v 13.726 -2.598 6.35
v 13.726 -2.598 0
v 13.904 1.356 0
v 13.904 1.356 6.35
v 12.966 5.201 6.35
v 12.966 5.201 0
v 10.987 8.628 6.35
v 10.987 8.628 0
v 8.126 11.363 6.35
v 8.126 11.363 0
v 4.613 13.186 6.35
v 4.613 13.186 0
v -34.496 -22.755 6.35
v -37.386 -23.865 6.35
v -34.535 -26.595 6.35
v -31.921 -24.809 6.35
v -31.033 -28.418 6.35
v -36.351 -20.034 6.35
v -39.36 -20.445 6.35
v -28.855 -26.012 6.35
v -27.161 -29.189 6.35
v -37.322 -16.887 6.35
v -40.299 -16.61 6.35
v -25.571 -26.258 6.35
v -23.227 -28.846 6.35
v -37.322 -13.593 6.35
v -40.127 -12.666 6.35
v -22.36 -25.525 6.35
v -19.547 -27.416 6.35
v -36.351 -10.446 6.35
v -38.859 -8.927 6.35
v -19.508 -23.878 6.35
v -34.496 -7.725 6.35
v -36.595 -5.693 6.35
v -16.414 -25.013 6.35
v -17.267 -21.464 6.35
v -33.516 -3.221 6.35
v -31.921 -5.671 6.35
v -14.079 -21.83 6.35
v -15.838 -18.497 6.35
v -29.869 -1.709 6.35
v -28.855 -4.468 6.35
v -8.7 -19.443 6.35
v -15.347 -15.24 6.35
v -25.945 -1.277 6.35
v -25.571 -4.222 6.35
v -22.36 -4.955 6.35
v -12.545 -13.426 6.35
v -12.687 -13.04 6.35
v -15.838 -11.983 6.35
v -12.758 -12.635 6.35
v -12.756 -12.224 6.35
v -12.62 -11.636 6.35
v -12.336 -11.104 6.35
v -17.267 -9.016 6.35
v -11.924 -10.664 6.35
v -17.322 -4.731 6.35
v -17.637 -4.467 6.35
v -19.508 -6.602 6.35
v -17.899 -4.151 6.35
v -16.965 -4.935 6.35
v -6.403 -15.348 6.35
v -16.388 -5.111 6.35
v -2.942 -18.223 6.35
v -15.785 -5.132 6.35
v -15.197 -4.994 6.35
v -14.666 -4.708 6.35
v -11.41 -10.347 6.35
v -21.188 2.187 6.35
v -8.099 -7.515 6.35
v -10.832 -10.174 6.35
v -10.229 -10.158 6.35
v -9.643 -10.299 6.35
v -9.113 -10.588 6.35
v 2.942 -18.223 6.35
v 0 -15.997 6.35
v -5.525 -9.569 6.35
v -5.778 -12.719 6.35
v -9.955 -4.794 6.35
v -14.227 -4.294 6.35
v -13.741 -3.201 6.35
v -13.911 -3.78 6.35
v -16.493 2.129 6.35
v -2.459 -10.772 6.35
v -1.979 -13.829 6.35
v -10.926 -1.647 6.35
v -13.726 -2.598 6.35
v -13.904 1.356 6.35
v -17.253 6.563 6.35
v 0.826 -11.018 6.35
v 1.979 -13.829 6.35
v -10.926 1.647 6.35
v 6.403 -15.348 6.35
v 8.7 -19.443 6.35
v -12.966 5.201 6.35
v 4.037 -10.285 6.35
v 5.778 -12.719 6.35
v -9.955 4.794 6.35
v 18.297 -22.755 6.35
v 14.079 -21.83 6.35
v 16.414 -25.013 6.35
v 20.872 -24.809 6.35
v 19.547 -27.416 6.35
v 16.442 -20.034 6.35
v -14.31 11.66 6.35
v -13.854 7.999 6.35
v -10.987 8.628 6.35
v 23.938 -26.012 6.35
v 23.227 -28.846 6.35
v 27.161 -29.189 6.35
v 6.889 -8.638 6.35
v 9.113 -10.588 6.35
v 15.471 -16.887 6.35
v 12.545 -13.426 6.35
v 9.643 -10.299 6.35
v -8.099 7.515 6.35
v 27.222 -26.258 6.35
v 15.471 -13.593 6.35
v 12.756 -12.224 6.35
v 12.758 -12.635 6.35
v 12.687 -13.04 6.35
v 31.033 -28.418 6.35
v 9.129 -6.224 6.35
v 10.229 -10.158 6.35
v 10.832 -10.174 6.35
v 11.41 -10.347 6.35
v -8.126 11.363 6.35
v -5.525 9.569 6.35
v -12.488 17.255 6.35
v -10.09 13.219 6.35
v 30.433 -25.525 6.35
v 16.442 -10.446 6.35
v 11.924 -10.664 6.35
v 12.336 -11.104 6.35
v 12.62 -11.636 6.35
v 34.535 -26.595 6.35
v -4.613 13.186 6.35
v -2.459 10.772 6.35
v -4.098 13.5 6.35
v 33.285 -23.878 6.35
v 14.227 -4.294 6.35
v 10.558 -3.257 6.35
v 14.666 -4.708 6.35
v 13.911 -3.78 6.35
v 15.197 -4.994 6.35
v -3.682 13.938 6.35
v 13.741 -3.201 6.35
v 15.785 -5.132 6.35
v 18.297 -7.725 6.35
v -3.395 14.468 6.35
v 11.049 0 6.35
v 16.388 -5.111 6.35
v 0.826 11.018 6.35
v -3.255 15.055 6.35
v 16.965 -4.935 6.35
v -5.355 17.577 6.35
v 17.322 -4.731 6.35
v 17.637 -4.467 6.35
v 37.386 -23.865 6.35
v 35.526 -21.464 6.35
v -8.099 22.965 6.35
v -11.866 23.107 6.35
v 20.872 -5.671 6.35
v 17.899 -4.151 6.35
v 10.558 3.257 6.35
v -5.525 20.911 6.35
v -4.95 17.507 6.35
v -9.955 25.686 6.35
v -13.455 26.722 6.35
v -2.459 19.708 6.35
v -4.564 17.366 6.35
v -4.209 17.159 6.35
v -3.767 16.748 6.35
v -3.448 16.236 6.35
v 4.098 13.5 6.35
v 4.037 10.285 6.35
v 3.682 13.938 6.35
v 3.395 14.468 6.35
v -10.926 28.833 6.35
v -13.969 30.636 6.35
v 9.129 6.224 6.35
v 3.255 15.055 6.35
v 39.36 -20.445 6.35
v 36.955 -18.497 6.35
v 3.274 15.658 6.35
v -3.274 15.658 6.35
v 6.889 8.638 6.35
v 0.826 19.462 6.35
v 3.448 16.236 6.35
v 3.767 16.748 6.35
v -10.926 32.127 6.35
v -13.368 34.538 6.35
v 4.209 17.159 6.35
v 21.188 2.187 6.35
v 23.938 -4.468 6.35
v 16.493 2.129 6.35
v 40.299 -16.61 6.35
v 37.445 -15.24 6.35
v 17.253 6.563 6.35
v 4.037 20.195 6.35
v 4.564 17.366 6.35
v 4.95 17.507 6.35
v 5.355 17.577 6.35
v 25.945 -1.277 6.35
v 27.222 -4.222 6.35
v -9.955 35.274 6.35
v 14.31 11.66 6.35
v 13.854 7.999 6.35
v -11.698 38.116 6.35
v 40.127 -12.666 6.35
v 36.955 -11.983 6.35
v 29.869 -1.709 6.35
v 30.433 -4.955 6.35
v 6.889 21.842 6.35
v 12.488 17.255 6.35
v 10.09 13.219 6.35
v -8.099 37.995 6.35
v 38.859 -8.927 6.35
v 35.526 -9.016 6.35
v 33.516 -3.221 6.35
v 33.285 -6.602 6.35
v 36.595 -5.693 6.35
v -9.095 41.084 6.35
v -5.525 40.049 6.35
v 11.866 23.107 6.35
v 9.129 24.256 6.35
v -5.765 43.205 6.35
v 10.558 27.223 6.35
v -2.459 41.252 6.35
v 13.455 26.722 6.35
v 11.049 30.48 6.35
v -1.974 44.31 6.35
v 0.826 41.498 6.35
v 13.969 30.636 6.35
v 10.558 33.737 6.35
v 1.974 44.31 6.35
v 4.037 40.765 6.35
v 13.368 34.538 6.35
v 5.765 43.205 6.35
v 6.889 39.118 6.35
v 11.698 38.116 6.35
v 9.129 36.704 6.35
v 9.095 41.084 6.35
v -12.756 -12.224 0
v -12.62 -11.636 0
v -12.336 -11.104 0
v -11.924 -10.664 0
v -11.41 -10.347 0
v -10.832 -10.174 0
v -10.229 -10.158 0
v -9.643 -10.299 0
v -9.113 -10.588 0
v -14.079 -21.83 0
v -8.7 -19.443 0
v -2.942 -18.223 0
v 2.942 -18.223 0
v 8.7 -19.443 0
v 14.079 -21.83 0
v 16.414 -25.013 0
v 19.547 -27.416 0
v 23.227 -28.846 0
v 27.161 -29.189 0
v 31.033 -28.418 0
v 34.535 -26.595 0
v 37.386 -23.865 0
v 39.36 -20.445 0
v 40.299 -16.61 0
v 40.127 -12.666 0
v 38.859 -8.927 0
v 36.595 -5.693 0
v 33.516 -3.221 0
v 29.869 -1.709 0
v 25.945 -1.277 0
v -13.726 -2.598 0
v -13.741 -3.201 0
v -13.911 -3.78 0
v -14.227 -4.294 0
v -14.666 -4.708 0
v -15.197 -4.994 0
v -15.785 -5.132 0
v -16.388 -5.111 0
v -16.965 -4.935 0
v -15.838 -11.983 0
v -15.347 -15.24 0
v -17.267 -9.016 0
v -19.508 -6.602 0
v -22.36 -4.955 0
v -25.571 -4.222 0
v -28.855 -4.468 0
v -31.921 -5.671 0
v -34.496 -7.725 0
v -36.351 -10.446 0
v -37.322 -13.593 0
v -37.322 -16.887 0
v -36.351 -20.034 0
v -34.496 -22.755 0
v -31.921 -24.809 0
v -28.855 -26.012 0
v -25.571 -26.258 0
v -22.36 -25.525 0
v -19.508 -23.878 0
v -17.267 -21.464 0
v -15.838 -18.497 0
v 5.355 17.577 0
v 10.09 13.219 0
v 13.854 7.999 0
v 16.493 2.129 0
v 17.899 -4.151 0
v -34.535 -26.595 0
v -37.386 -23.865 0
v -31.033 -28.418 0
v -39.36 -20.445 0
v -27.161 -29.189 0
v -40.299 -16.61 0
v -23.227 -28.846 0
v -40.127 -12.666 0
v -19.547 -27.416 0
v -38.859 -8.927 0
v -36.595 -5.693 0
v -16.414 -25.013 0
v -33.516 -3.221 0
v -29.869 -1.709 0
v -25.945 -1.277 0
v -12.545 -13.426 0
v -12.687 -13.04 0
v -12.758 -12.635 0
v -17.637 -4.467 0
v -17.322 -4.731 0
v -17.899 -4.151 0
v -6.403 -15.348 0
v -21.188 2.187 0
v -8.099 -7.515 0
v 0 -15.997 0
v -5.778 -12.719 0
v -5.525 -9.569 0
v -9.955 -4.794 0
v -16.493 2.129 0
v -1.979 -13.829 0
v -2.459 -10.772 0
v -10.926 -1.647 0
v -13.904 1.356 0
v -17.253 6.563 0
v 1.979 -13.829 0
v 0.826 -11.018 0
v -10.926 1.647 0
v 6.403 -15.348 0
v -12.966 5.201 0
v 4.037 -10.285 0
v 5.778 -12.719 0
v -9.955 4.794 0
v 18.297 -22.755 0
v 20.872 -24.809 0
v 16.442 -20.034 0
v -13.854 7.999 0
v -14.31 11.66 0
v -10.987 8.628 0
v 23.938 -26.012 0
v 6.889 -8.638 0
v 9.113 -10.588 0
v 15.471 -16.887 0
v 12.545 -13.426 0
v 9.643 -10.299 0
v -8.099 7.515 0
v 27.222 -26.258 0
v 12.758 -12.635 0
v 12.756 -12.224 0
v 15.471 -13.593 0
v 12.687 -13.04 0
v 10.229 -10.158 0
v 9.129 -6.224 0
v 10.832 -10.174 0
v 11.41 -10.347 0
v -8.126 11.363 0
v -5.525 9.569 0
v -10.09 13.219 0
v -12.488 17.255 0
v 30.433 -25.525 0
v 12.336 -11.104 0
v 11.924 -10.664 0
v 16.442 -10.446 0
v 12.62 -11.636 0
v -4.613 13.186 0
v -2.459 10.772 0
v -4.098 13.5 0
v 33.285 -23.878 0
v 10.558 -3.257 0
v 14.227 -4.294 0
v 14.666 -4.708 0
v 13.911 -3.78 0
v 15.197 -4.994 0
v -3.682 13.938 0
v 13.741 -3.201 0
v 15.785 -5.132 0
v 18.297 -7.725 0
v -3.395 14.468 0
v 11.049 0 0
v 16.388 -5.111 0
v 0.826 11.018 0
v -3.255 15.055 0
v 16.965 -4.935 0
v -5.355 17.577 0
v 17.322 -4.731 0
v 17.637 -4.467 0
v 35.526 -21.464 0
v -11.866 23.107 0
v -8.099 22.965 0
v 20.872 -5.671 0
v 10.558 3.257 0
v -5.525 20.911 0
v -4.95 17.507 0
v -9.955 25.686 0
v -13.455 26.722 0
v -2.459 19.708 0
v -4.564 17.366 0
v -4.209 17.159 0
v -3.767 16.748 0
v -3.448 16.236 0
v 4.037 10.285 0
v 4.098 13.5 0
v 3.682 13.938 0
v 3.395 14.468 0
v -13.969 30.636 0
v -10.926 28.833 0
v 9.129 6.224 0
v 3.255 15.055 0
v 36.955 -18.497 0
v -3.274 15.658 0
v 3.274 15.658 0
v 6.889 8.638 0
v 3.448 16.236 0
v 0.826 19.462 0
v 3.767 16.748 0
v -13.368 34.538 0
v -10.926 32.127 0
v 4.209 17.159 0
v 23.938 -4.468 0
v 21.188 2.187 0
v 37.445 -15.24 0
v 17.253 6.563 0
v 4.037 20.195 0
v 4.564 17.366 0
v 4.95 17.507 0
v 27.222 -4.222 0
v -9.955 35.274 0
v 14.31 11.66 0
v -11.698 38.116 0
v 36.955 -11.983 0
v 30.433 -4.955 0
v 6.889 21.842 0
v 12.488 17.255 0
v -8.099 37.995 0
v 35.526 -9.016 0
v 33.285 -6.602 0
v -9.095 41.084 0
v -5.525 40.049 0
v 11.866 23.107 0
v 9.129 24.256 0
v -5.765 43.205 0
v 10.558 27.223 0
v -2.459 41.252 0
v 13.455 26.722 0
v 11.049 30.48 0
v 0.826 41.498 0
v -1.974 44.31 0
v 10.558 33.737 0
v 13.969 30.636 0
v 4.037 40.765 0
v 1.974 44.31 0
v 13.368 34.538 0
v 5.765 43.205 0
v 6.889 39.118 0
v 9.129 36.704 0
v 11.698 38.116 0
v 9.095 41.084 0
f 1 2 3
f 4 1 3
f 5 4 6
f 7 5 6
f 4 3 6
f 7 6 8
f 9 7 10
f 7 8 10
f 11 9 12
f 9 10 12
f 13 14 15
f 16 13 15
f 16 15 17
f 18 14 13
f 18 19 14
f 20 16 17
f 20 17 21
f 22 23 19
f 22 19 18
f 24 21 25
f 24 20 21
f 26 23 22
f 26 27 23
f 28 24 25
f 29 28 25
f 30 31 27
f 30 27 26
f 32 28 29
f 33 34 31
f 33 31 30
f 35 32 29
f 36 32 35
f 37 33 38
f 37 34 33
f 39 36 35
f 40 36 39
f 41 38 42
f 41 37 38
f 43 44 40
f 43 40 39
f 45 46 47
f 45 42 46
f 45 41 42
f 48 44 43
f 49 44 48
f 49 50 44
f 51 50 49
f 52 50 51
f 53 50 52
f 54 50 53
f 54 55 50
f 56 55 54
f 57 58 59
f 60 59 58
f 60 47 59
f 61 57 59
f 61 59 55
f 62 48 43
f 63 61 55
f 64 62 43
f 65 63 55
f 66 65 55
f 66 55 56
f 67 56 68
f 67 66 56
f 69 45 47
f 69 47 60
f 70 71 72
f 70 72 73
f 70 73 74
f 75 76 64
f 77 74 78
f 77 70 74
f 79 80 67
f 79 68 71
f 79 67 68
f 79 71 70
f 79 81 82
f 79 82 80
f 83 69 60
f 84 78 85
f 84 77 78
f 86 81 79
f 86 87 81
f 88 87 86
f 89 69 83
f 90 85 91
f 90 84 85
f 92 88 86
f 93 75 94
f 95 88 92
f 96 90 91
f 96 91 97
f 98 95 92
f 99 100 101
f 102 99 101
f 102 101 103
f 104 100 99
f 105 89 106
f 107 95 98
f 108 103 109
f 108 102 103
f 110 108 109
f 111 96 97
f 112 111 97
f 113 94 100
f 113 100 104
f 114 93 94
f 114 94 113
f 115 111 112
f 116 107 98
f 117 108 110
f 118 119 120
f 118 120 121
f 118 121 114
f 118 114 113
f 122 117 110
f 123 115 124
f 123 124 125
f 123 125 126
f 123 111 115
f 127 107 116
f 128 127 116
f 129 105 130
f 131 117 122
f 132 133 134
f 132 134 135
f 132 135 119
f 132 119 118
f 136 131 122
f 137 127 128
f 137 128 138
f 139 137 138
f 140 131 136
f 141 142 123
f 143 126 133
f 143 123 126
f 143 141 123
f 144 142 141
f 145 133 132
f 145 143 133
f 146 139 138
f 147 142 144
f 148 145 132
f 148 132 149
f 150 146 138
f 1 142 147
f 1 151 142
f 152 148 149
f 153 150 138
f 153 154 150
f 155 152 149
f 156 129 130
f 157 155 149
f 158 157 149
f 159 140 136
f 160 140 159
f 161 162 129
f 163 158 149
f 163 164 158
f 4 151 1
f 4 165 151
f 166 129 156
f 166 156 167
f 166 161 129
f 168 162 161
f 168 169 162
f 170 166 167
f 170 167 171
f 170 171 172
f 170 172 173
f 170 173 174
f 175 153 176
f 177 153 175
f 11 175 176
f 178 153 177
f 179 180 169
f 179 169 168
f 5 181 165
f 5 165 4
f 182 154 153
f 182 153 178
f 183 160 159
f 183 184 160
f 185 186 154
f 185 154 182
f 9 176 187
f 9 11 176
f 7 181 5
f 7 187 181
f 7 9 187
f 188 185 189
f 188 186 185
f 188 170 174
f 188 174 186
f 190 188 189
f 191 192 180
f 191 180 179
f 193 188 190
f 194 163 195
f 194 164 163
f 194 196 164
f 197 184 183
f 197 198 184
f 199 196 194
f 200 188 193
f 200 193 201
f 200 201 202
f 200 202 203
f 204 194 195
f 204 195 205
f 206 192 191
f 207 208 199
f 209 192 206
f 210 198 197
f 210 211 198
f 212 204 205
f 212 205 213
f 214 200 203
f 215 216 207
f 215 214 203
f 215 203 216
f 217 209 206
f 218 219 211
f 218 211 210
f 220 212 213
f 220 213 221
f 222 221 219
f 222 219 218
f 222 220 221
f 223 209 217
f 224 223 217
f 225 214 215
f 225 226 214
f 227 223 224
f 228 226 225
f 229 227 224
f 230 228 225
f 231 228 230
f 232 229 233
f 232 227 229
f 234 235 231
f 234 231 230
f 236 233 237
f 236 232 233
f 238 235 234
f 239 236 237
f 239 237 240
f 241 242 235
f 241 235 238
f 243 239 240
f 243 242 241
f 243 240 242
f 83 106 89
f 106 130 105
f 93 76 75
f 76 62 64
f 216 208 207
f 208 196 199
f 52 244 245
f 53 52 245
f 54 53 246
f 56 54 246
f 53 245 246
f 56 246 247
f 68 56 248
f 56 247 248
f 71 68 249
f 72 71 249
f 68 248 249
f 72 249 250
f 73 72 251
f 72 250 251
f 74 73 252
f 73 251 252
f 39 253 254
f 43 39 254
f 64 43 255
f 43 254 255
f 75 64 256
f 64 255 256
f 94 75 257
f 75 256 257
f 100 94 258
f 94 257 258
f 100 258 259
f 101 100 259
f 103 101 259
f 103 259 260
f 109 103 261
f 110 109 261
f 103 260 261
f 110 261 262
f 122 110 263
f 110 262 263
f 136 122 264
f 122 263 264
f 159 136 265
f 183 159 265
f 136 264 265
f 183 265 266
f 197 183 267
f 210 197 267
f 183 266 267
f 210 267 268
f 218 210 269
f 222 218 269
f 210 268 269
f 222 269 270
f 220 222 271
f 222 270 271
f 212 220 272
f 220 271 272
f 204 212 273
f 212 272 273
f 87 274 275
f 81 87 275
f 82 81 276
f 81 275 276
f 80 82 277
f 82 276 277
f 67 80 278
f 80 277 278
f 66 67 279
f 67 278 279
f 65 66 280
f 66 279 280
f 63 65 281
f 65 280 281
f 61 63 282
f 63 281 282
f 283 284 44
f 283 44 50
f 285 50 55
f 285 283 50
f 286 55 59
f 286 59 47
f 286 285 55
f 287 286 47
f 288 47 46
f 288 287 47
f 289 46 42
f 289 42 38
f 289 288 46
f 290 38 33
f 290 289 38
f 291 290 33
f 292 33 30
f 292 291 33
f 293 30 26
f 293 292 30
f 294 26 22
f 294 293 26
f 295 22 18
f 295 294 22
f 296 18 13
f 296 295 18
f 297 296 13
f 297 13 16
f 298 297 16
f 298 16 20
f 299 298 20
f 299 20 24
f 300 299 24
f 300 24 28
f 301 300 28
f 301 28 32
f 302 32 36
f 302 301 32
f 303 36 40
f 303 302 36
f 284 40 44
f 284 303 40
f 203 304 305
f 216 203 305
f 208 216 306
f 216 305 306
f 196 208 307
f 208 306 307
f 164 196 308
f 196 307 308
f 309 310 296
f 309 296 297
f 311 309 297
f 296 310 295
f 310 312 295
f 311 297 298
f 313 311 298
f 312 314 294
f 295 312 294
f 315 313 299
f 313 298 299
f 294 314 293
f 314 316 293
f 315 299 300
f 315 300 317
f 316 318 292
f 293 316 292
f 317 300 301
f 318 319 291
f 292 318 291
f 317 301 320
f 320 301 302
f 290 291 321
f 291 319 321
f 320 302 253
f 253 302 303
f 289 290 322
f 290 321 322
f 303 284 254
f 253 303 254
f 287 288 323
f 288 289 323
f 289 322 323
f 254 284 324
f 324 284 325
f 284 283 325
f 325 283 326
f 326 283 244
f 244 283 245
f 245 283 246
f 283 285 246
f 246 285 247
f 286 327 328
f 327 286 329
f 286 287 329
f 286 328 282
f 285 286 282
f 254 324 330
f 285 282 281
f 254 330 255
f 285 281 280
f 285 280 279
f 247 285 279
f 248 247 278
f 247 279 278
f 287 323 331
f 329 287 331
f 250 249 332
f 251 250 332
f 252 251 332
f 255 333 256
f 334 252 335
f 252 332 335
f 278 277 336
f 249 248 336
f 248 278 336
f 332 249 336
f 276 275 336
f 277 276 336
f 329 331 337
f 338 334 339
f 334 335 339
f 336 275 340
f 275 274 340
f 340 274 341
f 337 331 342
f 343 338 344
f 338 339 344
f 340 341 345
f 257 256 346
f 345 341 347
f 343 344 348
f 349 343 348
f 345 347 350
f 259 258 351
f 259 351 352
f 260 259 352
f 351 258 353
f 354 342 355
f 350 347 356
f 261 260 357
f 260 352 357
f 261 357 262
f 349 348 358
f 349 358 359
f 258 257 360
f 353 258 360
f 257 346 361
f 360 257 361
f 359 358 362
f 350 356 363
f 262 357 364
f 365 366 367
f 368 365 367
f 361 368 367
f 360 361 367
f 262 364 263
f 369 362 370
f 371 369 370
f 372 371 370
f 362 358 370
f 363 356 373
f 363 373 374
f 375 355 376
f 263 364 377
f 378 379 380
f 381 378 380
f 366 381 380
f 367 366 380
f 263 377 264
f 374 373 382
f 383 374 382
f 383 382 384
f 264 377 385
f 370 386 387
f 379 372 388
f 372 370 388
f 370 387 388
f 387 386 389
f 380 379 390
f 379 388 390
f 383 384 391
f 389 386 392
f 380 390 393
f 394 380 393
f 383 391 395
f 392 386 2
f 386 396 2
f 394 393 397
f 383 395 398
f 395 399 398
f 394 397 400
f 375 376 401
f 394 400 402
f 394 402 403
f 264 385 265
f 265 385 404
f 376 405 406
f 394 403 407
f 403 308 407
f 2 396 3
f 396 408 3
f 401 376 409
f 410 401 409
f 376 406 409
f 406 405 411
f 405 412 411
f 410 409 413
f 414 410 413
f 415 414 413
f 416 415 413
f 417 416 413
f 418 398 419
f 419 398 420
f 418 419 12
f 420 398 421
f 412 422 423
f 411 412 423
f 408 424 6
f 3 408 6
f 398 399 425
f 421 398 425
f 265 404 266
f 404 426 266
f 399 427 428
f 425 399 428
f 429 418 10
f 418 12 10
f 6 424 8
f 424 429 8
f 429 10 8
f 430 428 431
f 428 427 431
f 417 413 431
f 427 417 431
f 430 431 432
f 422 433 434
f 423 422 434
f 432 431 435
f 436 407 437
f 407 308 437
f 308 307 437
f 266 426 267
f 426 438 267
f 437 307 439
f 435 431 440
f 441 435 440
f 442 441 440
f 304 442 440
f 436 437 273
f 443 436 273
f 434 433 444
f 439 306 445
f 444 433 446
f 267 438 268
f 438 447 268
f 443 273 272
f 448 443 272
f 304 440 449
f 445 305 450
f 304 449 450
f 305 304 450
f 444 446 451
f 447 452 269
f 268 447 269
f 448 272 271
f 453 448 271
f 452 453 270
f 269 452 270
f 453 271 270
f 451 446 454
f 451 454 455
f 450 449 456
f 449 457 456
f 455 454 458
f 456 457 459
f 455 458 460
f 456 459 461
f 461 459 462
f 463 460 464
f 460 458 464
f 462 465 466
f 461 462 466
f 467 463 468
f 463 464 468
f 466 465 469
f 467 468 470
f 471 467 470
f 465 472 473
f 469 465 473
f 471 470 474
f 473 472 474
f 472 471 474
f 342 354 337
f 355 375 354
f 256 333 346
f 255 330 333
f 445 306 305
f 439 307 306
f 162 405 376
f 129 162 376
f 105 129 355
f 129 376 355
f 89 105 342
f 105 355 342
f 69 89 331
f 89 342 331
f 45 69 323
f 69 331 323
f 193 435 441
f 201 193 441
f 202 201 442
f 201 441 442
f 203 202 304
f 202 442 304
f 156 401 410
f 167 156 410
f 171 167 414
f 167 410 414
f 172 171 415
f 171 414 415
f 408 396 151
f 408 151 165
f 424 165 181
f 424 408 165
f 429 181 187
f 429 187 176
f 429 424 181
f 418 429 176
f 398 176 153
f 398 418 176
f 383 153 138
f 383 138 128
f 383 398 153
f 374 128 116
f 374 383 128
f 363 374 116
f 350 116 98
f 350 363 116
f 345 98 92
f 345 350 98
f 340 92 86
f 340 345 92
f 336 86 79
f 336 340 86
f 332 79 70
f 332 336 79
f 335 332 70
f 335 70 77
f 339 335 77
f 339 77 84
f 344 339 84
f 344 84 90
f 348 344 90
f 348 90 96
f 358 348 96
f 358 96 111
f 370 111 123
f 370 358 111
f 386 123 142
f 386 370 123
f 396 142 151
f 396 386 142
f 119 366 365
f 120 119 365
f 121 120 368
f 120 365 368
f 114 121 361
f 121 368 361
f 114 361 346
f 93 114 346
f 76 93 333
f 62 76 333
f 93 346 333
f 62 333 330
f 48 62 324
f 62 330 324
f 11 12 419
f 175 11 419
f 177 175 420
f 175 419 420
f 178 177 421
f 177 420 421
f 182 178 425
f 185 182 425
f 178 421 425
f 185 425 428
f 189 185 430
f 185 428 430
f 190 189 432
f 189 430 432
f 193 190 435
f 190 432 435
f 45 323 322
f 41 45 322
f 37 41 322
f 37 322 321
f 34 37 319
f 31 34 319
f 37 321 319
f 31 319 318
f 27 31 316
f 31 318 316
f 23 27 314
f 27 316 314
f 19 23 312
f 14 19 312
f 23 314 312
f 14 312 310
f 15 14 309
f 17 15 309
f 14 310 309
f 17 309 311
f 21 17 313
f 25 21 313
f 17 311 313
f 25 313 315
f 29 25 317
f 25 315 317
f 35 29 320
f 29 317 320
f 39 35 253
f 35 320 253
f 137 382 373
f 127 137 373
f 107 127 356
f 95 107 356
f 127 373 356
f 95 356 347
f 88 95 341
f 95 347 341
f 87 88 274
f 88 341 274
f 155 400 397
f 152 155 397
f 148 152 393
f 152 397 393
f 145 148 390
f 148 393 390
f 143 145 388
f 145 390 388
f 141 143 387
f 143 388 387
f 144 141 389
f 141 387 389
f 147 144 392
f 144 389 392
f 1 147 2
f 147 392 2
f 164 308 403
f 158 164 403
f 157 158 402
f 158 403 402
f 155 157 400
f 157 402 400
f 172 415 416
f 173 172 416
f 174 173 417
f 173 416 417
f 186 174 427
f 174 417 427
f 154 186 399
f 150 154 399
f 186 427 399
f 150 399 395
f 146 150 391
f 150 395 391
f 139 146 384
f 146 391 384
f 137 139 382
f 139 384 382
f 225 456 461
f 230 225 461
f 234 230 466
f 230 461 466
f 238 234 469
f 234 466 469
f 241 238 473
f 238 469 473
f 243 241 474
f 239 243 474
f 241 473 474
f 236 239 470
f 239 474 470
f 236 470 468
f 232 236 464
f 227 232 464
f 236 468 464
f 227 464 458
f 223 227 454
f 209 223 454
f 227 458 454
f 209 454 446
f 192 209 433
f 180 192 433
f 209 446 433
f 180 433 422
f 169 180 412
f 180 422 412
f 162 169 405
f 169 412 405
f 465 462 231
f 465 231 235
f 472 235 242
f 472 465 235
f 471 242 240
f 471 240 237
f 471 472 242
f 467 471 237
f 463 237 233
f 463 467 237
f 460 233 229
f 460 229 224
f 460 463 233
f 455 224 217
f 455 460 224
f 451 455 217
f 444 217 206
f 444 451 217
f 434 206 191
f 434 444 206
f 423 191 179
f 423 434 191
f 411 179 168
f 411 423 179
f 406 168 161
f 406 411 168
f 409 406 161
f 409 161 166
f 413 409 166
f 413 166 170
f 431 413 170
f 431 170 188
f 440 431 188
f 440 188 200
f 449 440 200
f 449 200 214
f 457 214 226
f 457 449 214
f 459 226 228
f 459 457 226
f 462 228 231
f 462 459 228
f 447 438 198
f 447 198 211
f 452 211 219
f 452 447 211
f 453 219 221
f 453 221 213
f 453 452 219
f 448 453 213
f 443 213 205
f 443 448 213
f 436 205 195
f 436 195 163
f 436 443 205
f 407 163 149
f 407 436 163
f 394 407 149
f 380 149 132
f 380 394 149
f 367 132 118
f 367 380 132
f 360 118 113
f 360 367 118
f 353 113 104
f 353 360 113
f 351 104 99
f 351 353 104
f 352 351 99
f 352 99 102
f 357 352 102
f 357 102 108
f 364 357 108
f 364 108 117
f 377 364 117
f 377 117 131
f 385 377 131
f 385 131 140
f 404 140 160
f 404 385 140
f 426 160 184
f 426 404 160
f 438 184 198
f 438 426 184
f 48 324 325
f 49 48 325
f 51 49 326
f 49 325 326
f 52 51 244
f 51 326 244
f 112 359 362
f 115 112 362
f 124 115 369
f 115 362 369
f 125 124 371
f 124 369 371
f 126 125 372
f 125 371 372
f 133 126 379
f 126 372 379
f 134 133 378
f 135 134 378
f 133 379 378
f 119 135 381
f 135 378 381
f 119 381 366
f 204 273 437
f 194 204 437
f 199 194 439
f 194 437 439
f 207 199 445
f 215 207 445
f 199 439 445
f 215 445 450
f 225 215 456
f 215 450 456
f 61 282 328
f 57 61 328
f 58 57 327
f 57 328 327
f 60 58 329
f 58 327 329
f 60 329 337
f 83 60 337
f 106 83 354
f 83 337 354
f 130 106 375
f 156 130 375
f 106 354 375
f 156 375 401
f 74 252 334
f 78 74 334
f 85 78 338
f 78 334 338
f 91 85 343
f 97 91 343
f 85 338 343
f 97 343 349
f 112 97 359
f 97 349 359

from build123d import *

# Parameters (mm, degrees)
F0_R     = 11.049
F1_DEPTH = 6.35


with BuildPart() as f1:
    # F0 (on Top) → F1 (new body)
    with BuildSketch(Plane.XY):
        with BuildLine():
            ThreePointArc((-14.078526, -21.830109), (0, -18.069067), (14.078526, -21.830109))
            ThreePointArc((14.078526, -21.830109), (38.494829, -22.225), (25.944692, -1.277306))
            ThreePointArc((25.944692, -1.277306), (15.648271, 9.034534), (11.866166, 23.107415))
            ThreePointArc((11.866166, 23.107415), (0, 44.45), (-11.866166, 23.107415))
            ThreePointArc((-11.866166, 23.107415), (-15.648271, 9.034534), (-25.944692, -1.277306))
            ThreePointArc((-25.944692, -1.277306), (-38.494829, -22.225), (-14.078526, -21.830109))
        make_face()
        with Locations((-26.396454, -15.24)):
            Circle(F0_R, mode=Mode.SUBTRACT)
        with BuildLine():
            ThreePointArc((-4.208703, 17.15905), (-3.25535, 15.05507), (-4.613117, 13.186358))
            ThreePointArc((-4.613117, 13.186358), (-12.098375, 6.985), (-13.72628, -2.598103))
            ThreePointArc((-13.72628, -2.598103), (-14.665748, -4.708319), (-16.964525, -4.934681))
            ThreePointArc((-16.964525, -4.934681), (-17.48494, -4.606139), (-17.89943, -4.1512))
            ThreePointArc((-17.89943, -4.1512), (-13.85397, 7.998594), (-5.354671, 17.576961))
            ThreePointArc((-5.354671, 17.576961), (-4.753437, 17.445472), (-4.208703, 17.15905))
        make_face(mode=Mode.SUBTRACT)
        with BuildLine():
            ThreePointArc((12.54476, -13.425761), (0, -15.997187), (-12.54476, -13.425761))
            ThreePointArc((-12.54476, -13.425761), (-12.731503, -12.839333), (-12.755821, -12.224369))
            ThreePointArc((-12.755821, -12.224369), (-11.410398, -10.346751), (-9.113163, -10.588256))
            ThreePointArc((-9.113163, -10.588256), (0, -13.97), (9.113163, -10.588256))
            ThreePointArc((9.113163, -10.588256), (11.410398, -10.346751), (12.755821, -12.224369))
            ThreePointArc((12.755821, -12.224369), (12.731503, -12.839333), (12.54476, -13.425761))
        make_face(mode=Mode.SUBTRACT)
        with Locations((26.396454, -15.24)):
            Circle(F0_R, mode=Mode.SUBTRACT)
        Circle(F0_R, mode=Mode.SUBTRACT)
        with BuildLine():
            ThreePointArc((5.354671, 17.576961), (13.85397, 7.998594), (17.89943, -4.1512))
            ThreePointArc((17.89943, -4.1512), (17.48494, -4.606139), (16.964525, -4.934681))
            ThreePointArc((16.964525, -4.934681), (14.665748, -4.708319), (13.72628, -2.598103))
            ThreePointArc((13.72628, -2.598103), (12.098375, 6.985), (4.613117, 13.186358))
            ThreePointArc((4.613117, 13.186358), (3.25535, 15.05507), (4.208703, 17.15905))
            ThreePointArc((4.208703, 17.15905), (4.753437, 17.445472), (5.354671, 17.576961))
        make_face(mode=Mode.SUBTRACT)
        with Locations((0, 30.48)):
            Circle(F0_R, mode=Mode.SUBTRACT)
    extrude(amount=F1_DEPTH)


solid = f1.part
